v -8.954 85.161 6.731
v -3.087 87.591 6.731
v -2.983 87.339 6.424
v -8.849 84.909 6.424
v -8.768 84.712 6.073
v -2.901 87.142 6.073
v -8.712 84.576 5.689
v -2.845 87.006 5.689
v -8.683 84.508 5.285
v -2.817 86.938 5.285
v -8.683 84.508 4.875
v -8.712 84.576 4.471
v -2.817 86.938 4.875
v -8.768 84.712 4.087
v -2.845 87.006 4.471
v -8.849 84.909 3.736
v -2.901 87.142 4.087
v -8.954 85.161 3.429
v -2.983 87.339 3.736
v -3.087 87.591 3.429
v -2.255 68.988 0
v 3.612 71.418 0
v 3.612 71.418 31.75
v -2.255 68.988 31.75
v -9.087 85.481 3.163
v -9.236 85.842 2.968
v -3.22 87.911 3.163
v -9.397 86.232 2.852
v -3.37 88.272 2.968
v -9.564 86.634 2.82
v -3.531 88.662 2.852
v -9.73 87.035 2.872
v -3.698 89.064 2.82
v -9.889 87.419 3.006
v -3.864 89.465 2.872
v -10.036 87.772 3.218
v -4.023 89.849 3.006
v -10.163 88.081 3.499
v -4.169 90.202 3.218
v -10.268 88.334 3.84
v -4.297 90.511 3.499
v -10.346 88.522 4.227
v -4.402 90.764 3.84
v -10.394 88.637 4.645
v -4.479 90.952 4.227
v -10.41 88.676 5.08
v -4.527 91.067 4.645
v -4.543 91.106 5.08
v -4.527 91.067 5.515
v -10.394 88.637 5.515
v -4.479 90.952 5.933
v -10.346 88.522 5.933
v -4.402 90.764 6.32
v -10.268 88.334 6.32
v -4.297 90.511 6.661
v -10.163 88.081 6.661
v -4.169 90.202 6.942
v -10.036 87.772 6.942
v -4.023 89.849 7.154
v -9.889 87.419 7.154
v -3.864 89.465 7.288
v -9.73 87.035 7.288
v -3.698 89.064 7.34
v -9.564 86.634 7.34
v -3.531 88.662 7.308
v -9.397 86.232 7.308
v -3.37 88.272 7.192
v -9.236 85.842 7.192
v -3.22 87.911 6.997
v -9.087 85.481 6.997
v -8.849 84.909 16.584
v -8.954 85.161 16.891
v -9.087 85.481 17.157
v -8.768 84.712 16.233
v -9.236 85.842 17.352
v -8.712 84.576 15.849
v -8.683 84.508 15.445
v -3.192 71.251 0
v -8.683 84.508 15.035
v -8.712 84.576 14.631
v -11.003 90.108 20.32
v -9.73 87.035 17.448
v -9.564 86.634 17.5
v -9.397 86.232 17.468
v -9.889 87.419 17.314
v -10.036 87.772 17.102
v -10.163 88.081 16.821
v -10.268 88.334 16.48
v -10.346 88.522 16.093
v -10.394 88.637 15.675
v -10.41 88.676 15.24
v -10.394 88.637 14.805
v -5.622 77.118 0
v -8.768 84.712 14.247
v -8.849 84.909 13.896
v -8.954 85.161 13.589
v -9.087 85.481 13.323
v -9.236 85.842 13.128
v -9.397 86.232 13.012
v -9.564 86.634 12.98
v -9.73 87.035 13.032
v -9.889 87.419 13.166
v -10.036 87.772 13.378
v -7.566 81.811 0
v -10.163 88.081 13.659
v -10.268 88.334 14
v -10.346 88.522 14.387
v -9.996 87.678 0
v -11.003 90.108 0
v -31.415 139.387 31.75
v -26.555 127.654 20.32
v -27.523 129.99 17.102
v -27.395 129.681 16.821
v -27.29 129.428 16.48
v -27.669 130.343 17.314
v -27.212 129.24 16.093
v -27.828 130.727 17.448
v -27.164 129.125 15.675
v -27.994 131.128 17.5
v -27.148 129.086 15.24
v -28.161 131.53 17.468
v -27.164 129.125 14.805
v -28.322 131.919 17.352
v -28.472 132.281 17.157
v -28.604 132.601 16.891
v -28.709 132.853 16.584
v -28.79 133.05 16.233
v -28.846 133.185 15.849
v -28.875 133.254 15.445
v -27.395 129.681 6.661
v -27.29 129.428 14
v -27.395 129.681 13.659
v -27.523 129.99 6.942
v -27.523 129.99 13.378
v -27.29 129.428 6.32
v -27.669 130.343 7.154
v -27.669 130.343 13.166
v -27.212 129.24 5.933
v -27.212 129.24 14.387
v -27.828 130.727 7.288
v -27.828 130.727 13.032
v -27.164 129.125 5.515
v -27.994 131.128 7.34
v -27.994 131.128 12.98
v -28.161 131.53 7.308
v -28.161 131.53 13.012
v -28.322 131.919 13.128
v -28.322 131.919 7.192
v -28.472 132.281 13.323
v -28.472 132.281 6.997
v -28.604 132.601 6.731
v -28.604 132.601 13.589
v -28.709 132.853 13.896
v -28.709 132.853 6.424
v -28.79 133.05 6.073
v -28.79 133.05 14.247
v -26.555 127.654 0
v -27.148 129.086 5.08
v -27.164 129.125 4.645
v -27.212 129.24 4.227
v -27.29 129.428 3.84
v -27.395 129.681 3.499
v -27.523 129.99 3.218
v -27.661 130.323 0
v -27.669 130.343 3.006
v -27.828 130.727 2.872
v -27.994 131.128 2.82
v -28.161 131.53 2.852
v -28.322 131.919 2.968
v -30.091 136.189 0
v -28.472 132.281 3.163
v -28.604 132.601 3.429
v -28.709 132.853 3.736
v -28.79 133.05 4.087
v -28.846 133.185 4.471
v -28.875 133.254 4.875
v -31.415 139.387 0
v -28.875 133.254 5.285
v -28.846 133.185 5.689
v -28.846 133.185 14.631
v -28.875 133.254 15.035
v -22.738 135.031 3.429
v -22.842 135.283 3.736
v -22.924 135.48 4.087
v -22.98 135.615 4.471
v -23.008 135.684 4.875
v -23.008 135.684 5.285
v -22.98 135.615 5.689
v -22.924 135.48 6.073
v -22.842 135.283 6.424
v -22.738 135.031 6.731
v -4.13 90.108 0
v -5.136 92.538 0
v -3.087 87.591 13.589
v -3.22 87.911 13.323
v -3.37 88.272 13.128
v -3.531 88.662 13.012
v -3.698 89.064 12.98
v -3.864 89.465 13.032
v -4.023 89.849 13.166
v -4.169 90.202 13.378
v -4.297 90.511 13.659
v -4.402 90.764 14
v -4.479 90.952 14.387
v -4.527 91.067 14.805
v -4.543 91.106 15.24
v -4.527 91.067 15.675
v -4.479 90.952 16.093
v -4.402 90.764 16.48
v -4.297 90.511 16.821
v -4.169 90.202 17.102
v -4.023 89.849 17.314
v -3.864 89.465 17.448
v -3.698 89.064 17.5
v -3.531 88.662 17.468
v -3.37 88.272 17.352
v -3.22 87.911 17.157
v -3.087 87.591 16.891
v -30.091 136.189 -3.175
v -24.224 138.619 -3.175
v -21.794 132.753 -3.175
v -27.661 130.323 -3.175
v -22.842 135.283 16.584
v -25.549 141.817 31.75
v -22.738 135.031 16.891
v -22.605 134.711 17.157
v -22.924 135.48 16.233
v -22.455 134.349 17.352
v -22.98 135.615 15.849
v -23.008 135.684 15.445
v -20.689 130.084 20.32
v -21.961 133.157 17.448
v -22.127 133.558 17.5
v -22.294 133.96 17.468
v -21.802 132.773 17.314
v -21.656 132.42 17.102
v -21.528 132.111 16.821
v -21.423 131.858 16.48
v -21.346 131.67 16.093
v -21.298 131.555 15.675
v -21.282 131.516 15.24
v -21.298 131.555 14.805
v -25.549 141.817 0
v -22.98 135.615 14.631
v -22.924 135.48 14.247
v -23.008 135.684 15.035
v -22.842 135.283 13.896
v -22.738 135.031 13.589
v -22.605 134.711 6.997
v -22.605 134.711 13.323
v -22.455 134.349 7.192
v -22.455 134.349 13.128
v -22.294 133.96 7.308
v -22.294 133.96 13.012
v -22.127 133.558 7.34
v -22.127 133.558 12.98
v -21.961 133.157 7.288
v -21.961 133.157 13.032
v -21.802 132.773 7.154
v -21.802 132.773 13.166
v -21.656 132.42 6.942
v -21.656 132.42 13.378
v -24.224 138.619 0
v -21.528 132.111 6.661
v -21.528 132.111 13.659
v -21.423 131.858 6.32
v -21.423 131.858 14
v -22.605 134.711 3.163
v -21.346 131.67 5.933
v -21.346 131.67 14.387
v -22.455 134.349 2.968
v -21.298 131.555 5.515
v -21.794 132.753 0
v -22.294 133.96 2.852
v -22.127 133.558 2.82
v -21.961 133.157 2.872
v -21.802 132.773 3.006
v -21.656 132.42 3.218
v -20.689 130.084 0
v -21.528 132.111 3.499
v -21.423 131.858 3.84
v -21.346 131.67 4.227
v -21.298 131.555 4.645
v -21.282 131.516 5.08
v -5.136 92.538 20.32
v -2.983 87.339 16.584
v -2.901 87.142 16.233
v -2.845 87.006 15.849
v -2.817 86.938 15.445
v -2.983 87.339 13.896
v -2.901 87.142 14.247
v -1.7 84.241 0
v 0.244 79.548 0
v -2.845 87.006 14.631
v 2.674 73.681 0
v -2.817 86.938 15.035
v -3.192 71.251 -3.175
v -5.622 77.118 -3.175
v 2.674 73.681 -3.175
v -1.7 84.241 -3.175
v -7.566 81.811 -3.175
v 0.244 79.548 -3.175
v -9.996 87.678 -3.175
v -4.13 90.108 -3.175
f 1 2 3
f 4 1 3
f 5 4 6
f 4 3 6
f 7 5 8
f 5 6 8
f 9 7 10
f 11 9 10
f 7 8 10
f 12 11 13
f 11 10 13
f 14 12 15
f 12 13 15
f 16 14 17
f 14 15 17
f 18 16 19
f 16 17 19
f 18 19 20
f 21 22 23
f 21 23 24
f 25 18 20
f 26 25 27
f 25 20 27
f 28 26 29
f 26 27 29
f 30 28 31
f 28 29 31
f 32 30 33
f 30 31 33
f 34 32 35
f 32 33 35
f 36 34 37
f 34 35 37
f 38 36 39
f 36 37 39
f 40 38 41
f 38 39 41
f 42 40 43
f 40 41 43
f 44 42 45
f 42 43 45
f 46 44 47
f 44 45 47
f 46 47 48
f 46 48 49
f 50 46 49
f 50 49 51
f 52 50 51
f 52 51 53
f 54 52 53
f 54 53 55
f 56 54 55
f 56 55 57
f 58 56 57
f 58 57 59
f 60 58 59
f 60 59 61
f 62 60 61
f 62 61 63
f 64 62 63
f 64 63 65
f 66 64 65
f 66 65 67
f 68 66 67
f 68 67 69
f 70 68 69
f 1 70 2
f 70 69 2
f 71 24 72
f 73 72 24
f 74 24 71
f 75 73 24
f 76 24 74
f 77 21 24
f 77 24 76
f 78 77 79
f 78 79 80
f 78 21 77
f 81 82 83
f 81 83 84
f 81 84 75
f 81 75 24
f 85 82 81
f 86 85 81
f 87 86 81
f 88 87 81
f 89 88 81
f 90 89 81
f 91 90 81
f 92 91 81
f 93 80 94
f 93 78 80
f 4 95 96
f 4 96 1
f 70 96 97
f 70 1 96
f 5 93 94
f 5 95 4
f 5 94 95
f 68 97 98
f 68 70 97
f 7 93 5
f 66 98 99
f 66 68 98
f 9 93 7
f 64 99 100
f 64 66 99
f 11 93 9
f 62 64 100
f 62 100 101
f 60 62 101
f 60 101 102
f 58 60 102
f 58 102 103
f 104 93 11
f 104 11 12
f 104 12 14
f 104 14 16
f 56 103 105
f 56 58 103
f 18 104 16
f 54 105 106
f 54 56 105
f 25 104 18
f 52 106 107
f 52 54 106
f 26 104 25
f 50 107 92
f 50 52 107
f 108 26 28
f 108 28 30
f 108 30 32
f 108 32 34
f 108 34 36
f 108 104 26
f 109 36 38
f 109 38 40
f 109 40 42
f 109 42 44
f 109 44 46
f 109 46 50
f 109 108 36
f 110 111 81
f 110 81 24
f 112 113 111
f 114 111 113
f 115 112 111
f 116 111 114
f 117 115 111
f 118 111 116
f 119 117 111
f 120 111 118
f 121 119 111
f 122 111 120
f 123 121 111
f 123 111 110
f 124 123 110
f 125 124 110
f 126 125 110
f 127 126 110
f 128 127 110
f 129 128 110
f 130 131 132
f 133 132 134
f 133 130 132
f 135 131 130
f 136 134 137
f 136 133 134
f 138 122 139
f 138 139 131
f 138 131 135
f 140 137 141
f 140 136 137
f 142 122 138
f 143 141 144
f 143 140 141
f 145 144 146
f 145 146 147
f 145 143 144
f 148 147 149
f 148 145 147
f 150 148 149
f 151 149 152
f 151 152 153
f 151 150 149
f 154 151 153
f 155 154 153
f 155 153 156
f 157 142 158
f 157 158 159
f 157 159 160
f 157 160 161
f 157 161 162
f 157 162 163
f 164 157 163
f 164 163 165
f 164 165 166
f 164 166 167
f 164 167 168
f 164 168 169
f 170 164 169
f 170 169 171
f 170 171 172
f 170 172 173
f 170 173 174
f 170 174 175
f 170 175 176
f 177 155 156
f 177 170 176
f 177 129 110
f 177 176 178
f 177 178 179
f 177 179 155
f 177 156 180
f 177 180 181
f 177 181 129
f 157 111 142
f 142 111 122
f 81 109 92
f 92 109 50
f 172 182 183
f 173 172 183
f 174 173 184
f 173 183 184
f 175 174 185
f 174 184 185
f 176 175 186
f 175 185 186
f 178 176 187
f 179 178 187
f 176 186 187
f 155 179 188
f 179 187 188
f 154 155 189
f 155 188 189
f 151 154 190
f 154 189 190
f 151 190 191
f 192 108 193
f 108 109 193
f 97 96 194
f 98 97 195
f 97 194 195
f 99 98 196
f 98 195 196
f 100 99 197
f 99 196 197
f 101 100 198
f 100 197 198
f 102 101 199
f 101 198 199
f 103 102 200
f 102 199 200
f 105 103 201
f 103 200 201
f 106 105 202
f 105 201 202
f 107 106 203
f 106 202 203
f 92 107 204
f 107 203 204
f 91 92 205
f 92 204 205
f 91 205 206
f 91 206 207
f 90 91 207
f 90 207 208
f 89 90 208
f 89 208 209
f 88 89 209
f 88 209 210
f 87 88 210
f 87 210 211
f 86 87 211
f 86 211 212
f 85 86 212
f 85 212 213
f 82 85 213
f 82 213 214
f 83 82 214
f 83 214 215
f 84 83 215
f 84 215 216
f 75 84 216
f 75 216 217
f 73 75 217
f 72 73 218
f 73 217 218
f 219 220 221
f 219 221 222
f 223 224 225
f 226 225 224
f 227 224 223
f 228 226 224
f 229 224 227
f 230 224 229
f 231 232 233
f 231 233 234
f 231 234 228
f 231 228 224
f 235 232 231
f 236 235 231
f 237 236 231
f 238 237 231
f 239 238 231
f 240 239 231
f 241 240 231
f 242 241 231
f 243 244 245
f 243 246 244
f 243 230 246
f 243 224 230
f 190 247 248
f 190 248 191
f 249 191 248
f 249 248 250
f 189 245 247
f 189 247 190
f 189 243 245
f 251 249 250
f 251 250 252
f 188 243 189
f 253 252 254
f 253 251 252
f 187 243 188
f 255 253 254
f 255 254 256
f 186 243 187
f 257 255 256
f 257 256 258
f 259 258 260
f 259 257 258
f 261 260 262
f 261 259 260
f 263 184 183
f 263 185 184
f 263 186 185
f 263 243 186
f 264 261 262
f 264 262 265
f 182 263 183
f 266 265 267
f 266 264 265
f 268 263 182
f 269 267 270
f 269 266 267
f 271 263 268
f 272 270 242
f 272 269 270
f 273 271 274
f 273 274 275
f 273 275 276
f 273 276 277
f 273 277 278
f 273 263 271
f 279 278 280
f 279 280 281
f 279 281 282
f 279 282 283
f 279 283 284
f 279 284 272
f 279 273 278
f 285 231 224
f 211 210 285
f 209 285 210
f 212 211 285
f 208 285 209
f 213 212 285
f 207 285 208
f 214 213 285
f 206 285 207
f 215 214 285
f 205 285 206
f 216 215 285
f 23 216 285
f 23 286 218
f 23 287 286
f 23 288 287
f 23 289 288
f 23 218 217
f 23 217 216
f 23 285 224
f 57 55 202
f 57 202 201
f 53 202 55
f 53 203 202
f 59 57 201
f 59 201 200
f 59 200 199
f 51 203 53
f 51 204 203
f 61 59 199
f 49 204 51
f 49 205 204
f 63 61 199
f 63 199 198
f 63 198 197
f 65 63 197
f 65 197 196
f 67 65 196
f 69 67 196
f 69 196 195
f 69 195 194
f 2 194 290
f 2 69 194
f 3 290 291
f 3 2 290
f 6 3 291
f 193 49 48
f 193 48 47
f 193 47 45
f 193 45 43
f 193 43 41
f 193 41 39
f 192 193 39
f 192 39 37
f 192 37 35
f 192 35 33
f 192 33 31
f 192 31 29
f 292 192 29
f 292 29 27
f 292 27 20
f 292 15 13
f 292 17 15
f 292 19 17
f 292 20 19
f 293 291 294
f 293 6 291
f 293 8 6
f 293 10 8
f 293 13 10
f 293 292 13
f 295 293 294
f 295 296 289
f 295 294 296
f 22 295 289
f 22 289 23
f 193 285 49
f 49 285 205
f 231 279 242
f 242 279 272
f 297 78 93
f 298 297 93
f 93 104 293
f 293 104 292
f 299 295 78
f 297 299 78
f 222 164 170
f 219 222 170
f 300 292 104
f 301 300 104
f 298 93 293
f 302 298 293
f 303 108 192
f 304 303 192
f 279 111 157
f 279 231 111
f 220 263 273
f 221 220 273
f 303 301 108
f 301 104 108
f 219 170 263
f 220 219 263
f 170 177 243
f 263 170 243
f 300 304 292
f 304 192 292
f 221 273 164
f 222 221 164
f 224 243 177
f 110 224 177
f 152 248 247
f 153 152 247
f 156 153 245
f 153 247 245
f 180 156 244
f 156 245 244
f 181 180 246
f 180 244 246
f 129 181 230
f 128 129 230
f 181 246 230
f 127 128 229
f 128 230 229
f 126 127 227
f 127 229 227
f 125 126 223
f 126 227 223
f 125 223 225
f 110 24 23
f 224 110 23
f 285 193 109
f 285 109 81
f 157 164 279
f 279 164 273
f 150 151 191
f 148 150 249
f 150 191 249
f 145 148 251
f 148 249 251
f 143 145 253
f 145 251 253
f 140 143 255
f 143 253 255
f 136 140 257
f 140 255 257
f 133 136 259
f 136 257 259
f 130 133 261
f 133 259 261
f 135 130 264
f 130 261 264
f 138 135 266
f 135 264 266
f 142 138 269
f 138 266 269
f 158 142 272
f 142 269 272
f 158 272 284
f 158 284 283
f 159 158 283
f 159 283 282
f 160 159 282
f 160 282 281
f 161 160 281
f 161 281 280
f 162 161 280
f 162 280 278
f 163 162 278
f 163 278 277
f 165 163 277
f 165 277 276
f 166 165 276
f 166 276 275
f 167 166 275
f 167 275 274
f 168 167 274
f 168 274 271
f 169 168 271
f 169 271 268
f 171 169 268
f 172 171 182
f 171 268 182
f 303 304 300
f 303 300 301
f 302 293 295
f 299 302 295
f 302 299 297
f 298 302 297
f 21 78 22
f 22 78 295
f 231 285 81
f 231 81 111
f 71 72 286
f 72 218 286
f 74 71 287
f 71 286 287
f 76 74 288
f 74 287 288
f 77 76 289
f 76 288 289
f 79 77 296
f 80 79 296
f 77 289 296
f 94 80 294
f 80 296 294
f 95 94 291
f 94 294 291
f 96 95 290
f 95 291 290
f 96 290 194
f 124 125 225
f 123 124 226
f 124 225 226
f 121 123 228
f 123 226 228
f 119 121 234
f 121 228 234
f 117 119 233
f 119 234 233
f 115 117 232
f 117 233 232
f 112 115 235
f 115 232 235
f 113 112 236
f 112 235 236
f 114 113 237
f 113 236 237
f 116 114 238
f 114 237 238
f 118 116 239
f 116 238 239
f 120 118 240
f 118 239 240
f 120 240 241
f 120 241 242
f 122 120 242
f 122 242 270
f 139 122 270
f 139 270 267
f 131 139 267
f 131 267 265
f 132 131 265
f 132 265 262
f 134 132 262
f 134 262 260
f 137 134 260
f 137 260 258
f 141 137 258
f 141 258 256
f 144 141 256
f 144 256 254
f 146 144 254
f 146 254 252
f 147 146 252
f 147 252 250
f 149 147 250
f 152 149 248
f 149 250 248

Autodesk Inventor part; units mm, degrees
ref_plane "YZ Plane" through (0, 0, 0) normal (1, 0, 0) x (0, 1, 0)
ref_plane "XZ Plane" through (0, 0, 0) normal (0, 1, 0) x (-1, 0, 0)
ref_plane "XY Plane" through (0, 0, 0) normal (0, 0, 1) x (1, 0, 0)
ref_plane "Work Plane1" through (0, 0, 0) normal (0, 0, 1) x (1, 0, 0)
sketch "Sketch1" plane through (0, 0, 0) normal (0, 0, 1) x (1, 0, 0)
  line L0 (0, 152.4) -> (-45.5982, 133.5126) projected
  line L1 (-31.4153, 139.3873) -> (-25.5487, 141.8174)
  line L2 (-25.5487, 141.8174) -> (3.6118, 71.4178)
  line L3 (3.6118, 71.4178) -> (-2.2548, 68.9877)
  line L4 (-2.2548, 68.9877) -> (-31.4153, 139.3873)
  point P0 (0, 0)
  dimension "d0" = 6.35
  dimension "d1" = 76.2
extrude "Extrusion1" add sketch "Sketch1" along normal blind 31.75
sketch "Sketch2" plane through (-25.5487, 141.8174, 31.75) normal (0.9238795, 0.3826834, 0) x (0, 0, -1)
  line L0 (11.43, -52.324) -> (11.43, -13.716) projected
  line L1 (30.734, -53.34) -> (12.446, -53.34) projected
  line L2 (12.446, -12.7) -> (20.955, -12.7) projected
  line L3 (11.43, -53.34) -> (11.43, -12.7)
  line L4 (11.43, -12.7) -> (31.75, -12.7)
  line L5 (31.75, -12.7) -> (31.75, -53.34)
  line L6 (31.75, -53.34) -> (11.43, -53.34)
  point P0 (31.75, -140.7992)
extrude "Extrusion2" cut sketch "Sketch2" against normal through all
sketch "Sketch3" plane through (-25.5487, 141.8174, 31.75) normal (0.9238795, 0.3826834, 0) x (0, 0, -1)
  arc A0 (18.161, -58.6942) -> (14.859, -58.6942) centre (16.51, -57.15) ccw projected
  arc A1 (28.321, -58.6942) -> (25.019, -58.6942) centre (26.67, -57.15) ccw projected
  arc A2 (14.859, -7.3458) -> (18.161, -7.3458) centre (16.51, -8.89) ccw projected
  arc A3 (25.019, -7.3458) -> (28.321, -7.3458) centre (26.67, -8.89) ccw projected
  circle A4 centre (16.51, -57.15) radius 2.2606
  circle A5 centre (26.67, -57.15) radius 2.2606
  circle A6 centre (16.51, -8.89) radius 2.2606
  circle A7 centre (26.67, -8.89) radius 2.2606
  point P0 (31.75, -140.7992)
extrude "Extrusion3" cut sketch "Sketch3" against normal through all
sketch "Sketch4" plane through (0, 0, 0) normal (0, 0, -1) x (-1, 0, 0)
  line L0 (11.003, 90.1076) -> (5.1363, 92.5377) construction
  line L1 (5.1363, 92.5377) -> (-3.6118, 71.4178) construction
  line L2 (-3.6118, 71.4178) -> (2.2548, 68.9877) construction
  line L3 (2.2548, 68.9877) -> (11.003, 90.1076) construction
  line L4 (20.6886, 130.0841) -> (26.5552, 127.6541) construction
  line L5 (26.5552, 127.6541) -> (31.4153, 139.3873) construction
  line L6 (31.4153, 139.3873) -> (25.5487, 141.8174) construction
  line L7 (25.5487, 141.8174) -> (20.6886, 130.0841) construction
  line L8 (24.224, 138.6194) -> (21.794, 132.7528)
  line L9 (21.794, 132.7528) -> (27.6606, 130.3227)
  line L10 (27.6606, 130.3227) -> (30.0907, 136.1894)
  line L11 (30.0907, 136.1894) -> (24.224, 138.6194)
  line L12 (4.1298, 90.1076) -> (1.6998, 84.241)
  line L13 (1.6998, 84.241) -> (7.5664, 81.8109)
  line L14 (7.5664, 81.8109) -> (9.9964, 87.6776)
  line L15 (9.9964, 87.6776) -> (4.1298, 90.1076)
  line L16 (-0.2443, 79.5477) -> (-2.6743, 73.681)
  line L17 (-2.6743, 73.681) -> (3.1923, 71.251)
  line L18 (3.1923, 71.251) -> (5.6224, 77.1176)
  line L19 (5.6224, 77.1176) -> (-0.2443, 79.5477)
  point P0 (0, 0)
  dimension "d8" = 6.35
  dimension "d9" = 6.35
  dimension "d10" = 6.35
  dimension "d11" = 6.35
  dimension "d12" = 6.35
extrude "Extrusion4" add sketch "Sketch4" along normal blind 3.175
properties part number "servoMountPlate"
